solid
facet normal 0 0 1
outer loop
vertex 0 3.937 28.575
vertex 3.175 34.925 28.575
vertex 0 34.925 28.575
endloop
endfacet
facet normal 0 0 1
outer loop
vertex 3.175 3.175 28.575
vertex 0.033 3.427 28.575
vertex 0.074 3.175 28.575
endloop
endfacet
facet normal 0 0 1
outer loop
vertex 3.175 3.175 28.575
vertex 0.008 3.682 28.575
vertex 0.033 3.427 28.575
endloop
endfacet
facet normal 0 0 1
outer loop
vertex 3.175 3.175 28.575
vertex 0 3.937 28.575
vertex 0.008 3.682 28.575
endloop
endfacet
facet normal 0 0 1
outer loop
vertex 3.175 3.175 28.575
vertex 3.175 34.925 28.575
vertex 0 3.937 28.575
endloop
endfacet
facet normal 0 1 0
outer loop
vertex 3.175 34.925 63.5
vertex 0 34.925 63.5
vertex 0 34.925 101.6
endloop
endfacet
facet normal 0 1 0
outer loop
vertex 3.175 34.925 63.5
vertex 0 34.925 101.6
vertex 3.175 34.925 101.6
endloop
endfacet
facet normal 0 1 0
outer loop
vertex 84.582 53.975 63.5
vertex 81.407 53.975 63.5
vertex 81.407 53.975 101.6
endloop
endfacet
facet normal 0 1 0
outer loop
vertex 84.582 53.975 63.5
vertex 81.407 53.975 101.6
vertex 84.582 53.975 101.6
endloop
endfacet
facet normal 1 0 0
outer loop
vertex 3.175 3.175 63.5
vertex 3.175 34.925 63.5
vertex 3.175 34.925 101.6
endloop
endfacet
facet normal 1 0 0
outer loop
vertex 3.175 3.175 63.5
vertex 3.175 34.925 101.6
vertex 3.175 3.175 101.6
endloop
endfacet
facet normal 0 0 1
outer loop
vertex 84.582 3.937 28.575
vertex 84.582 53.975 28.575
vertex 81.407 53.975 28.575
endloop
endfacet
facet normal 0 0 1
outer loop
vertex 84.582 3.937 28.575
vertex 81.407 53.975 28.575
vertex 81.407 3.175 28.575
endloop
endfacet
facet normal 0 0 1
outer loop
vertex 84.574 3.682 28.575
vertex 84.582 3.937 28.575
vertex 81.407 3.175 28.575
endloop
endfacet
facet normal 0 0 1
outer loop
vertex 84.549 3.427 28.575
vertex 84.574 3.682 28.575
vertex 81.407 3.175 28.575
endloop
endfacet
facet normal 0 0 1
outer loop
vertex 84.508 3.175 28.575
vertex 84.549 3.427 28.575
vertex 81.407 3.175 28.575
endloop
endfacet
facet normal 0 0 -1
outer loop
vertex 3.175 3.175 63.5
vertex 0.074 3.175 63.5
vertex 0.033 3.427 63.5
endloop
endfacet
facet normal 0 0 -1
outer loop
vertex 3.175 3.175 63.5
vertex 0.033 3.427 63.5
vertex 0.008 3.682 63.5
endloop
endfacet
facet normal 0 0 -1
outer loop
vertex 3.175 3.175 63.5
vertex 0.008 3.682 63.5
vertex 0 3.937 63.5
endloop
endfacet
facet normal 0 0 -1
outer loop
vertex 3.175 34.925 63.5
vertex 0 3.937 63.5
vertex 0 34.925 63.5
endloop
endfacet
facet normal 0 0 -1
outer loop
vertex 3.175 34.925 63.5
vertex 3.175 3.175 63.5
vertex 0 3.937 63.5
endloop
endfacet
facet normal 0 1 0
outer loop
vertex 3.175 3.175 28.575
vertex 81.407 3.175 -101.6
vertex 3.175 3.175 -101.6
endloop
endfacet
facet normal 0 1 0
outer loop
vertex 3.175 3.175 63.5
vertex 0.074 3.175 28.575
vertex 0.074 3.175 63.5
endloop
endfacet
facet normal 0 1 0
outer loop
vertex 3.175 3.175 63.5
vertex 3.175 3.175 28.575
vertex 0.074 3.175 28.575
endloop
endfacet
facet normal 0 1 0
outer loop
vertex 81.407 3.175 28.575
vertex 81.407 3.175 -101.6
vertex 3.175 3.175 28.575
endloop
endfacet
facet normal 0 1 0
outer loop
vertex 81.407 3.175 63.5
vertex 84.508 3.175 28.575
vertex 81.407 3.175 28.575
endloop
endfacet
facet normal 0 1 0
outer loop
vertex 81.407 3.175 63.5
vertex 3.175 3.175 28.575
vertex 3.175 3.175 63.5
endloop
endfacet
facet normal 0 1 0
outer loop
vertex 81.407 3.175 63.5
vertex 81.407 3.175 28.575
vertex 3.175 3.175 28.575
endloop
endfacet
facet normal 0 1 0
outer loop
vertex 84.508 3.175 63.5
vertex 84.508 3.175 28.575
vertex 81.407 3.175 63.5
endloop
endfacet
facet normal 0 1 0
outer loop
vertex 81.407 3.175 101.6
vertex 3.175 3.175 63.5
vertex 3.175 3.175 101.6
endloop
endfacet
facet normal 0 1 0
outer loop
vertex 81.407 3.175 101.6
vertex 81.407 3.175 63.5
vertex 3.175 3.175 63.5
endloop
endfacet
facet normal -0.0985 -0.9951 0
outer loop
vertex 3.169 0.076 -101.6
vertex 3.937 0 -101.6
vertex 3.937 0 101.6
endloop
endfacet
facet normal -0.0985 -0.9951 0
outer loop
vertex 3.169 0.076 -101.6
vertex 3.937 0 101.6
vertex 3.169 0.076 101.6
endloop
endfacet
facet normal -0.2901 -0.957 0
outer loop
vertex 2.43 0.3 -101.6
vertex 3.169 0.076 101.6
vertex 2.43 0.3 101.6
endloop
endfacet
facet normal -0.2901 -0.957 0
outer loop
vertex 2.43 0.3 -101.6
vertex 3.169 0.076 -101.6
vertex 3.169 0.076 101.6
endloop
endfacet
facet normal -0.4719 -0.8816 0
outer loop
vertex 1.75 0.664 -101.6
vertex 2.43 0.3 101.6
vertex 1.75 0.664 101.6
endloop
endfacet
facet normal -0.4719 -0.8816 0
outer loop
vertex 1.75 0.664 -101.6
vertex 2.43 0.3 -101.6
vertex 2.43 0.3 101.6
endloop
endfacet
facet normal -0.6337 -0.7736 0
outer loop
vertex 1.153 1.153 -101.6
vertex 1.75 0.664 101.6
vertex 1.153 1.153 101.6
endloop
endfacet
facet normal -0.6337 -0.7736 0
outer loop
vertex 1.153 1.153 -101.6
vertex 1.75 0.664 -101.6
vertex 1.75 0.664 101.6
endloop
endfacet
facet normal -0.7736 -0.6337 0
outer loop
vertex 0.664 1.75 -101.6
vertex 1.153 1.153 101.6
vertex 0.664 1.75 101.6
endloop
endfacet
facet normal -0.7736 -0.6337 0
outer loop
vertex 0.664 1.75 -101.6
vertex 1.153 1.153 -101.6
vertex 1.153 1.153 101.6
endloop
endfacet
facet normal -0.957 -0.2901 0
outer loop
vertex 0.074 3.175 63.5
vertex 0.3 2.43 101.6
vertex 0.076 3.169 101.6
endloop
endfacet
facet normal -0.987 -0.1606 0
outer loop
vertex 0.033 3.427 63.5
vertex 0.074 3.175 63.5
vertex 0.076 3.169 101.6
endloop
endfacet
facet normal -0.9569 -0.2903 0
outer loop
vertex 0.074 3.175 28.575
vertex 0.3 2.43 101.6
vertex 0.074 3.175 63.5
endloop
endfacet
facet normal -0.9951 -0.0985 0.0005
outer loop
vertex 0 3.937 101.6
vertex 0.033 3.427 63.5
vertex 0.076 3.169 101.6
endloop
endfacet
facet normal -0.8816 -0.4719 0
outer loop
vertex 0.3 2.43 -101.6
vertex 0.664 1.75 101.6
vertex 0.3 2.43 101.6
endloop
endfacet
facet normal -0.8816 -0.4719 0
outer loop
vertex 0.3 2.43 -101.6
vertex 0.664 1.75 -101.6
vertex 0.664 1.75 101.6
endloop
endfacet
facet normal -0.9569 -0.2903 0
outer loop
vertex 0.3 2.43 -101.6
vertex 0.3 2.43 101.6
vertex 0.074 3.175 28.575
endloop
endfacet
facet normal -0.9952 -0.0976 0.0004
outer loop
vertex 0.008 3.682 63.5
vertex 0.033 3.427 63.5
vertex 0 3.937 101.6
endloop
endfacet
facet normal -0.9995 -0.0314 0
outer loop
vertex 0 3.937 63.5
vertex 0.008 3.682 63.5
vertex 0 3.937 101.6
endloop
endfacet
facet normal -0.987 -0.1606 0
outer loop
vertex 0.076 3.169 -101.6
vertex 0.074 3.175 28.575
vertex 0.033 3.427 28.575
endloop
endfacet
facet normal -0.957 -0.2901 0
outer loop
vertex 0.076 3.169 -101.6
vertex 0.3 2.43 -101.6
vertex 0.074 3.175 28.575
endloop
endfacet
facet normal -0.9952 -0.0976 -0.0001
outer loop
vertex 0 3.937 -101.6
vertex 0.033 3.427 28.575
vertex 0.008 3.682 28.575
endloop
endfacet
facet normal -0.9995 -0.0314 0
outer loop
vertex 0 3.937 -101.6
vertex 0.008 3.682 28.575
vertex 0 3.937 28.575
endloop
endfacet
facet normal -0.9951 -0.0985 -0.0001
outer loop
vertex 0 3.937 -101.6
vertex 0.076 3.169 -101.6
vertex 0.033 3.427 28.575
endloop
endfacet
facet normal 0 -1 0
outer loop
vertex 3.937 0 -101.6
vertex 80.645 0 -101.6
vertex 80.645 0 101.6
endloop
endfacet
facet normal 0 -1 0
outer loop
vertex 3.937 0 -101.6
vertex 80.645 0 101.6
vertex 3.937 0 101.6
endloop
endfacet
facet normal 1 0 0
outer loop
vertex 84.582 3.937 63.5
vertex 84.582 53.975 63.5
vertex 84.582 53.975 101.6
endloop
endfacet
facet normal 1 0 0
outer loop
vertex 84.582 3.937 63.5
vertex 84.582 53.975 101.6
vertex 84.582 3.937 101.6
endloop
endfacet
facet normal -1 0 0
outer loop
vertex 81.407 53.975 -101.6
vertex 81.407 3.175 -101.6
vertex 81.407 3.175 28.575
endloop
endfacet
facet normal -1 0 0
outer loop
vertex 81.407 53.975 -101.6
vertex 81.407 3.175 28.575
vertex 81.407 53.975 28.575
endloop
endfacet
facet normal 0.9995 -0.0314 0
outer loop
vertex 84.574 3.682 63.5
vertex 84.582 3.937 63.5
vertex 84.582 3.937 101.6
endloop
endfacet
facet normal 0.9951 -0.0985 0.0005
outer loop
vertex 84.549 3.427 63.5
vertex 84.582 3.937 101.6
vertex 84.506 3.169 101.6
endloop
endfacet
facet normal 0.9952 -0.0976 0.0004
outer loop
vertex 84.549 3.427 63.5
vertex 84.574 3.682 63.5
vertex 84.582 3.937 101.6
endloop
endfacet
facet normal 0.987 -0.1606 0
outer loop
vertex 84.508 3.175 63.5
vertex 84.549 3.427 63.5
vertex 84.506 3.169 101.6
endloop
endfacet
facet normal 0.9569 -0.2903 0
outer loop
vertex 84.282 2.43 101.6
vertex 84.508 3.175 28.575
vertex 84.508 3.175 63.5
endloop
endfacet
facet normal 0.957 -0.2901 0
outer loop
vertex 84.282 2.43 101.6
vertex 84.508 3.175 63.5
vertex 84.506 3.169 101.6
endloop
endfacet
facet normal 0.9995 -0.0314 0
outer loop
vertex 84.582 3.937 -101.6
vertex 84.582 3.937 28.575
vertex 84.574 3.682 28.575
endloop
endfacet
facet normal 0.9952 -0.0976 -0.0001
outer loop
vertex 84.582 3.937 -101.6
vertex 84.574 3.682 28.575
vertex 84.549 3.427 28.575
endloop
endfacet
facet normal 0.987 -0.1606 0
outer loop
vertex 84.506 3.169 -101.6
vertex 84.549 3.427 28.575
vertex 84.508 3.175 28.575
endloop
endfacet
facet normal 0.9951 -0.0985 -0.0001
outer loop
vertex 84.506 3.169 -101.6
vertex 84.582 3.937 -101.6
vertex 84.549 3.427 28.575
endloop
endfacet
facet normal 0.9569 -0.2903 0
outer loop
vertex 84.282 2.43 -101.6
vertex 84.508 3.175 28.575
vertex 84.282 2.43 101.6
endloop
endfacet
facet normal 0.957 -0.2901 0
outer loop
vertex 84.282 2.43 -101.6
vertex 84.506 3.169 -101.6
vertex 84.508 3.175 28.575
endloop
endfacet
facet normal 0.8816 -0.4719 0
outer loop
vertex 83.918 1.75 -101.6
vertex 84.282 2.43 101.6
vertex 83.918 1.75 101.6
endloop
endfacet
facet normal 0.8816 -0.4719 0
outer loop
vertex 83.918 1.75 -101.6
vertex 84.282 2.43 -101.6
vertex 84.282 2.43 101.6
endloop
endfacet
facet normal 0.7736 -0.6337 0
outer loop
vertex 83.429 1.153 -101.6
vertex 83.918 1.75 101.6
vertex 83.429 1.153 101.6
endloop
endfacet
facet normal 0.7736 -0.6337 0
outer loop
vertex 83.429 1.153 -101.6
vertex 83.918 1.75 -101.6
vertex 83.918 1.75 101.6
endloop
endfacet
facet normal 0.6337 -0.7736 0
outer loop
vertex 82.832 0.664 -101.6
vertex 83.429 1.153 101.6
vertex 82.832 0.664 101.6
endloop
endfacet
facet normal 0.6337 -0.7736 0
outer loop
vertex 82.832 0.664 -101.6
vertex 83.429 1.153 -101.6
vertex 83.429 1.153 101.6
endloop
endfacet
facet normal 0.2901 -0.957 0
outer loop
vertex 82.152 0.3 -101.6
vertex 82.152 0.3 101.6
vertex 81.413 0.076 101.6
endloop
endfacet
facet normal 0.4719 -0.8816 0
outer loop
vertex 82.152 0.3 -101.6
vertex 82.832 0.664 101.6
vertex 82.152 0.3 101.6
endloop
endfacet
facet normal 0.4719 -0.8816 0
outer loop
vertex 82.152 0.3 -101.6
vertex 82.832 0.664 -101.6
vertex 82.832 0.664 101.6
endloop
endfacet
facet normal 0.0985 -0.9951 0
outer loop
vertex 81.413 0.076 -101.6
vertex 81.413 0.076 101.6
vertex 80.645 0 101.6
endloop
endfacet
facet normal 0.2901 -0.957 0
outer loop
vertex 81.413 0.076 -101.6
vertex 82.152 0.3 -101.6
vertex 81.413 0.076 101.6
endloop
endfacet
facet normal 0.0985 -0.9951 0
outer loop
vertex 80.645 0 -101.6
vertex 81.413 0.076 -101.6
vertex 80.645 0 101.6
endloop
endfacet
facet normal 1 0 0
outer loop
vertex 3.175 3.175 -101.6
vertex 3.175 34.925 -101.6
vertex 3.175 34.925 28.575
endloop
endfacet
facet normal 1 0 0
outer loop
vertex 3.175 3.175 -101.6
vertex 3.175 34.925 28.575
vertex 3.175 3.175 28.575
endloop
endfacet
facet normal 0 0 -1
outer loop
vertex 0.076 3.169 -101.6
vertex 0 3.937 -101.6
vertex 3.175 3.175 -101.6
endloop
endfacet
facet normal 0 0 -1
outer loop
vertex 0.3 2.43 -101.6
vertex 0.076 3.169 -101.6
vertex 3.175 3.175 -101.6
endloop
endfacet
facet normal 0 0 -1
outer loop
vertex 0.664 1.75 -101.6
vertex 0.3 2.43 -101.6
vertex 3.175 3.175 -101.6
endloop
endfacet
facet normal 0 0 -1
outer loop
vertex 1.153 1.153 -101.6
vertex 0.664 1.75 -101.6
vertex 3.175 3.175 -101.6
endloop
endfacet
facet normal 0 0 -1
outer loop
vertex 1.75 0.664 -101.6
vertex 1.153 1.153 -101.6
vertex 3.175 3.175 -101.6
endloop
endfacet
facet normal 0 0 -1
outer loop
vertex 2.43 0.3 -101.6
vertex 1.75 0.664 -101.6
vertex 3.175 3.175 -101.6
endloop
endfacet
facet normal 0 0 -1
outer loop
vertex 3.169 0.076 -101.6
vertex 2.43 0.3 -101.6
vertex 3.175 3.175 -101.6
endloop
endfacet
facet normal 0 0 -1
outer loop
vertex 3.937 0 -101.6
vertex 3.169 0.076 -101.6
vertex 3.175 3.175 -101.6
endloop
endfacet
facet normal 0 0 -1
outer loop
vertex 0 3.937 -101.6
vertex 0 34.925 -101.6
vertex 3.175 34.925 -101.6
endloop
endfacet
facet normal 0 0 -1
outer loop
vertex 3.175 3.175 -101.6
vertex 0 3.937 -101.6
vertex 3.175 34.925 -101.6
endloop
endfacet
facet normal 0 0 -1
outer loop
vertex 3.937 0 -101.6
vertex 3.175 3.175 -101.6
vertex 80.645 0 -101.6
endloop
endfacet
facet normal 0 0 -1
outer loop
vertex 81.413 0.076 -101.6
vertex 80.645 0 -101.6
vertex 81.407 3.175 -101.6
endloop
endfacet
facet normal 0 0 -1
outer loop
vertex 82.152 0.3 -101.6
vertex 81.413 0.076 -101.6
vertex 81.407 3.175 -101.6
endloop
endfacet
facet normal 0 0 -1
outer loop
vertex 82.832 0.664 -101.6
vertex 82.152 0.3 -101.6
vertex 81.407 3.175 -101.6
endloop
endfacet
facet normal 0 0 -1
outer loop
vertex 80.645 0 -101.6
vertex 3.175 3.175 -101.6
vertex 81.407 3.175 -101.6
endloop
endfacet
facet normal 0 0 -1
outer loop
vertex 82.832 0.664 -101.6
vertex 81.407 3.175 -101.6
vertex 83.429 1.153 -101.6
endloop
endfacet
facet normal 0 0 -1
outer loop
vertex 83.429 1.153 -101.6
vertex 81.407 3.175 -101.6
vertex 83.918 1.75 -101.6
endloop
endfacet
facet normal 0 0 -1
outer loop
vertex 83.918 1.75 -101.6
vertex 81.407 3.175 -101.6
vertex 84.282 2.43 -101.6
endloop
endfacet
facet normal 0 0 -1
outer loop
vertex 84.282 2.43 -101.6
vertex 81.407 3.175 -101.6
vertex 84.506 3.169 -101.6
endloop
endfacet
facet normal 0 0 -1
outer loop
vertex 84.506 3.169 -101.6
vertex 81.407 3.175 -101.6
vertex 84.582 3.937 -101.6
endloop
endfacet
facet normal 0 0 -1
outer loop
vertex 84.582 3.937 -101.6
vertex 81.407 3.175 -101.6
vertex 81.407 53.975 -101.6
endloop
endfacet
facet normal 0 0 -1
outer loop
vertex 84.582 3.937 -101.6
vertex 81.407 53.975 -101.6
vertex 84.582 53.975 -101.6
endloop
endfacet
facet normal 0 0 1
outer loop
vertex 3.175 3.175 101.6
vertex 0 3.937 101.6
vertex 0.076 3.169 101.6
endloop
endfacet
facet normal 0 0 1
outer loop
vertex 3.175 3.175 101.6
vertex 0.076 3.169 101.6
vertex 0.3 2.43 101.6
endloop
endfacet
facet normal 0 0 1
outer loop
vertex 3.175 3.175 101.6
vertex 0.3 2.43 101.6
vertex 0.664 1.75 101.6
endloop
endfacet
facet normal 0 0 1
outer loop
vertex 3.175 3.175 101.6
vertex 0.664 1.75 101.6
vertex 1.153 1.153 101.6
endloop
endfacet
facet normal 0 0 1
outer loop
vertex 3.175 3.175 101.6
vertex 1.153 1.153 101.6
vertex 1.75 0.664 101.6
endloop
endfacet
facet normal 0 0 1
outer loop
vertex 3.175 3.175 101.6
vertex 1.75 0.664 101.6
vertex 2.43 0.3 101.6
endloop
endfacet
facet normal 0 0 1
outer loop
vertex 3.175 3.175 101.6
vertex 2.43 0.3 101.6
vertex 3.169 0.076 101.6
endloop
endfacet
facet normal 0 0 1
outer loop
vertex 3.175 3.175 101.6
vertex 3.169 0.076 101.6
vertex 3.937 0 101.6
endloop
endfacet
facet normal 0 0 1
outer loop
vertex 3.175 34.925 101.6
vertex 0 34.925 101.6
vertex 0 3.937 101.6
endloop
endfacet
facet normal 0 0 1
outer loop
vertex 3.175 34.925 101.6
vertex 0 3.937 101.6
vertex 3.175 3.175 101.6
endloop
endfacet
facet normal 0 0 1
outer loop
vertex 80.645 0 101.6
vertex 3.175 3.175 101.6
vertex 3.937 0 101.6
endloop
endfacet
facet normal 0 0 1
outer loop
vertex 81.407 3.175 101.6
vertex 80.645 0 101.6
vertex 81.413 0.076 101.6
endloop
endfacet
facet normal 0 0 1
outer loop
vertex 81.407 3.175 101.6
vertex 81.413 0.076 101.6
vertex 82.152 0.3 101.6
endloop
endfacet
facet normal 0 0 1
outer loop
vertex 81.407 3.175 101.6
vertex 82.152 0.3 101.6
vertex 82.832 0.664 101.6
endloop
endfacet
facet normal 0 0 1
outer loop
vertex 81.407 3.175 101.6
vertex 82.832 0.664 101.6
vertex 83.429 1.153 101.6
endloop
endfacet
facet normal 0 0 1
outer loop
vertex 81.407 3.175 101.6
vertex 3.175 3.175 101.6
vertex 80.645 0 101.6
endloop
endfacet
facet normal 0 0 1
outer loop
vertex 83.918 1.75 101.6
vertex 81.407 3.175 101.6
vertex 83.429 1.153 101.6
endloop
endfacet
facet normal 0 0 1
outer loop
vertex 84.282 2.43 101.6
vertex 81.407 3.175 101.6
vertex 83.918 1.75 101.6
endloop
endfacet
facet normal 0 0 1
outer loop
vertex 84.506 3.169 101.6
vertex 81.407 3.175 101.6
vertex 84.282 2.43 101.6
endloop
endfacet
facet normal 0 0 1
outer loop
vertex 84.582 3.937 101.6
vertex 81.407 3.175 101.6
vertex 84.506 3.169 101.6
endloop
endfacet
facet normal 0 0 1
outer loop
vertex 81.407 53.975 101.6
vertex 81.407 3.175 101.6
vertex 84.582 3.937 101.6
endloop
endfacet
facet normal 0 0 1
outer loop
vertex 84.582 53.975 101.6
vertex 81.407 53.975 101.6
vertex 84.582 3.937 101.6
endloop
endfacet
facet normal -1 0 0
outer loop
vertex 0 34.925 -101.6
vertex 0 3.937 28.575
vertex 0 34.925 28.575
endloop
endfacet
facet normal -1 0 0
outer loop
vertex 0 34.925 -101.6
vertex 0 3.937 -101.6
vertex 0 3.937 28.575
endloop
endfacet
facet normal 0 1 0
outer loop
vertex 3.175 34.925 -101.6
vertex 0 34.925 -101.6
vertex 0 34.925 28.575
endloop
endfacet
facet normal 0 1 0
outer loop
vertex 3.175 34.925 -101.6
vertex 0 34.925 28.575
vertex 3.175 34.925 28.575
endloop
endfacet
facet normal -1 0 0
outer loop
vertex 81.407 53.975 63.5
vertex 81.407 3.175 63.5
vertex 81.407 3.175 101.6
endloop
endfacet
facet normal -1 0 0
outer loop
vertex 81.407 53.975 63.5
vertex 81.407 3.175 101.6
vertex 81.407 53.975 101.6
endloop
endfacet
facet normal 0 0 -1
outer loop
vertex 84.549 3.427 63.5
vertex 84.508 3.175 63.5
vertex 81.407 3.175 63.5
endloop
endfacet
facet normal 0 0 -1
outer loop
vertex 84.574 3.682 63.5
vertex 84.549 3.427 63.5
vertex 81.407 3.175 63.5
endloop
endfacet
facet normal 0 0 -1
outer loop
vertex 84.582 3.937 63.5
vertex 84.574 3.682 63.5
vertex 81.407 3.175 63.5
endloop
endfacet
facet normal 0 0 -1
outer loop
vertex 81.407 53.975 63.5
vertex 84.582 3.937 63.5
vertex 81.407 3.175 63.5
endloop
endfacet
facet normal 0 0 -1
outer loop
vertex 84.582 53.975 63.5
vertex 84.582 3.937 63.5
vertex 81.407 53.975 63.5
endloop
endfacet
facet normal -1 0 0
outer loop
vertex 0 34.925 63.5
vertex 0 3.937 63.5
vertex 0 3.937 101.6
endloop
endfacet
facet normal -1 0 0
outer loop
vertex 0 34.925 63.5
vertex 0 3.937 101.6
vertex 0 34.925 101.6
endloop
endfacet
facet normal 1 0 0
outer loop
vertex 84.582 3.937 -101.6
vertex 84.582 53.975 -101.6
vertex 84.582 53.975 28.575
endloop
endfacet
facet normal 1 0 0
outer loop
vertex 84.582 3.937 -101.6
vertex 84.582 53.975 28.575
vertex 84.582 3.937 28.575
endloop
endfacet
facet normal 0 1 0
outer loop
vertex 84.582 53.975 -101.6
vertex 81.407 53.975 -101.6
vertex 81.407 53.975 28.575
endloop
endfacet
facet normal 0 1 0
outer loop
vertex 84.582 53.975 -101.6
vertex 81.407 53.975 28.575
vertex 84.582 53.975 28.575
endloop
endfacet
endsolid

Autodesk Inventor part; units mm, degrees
ref_plane "YZ Plane" through (0, 0, 0) normal (1, 0, 0) x (0, 1, 0)
ref_plane "XZ Plane" through (0, 0, 0) normal (0, 1, 0) x (-1, 0, 0)
sketch "Sketch1" plane through (0, 0, 0) normal (0, 0, 1) x (1, 0, 0)
  line L0 (0, 3.937) -> (0, 34.925)
  line L1 (0, 34.925) -> (3.175, 34.925)
  line L2 (3.175, 34.925) -> (3.175, 3.175)
  line L3 (3.175, 3.175) -> (81.407, 3.175)
  line L4 (81.407, 3.175) -> (81.407, 53.975)
  line L5 (81.407, 53.975) -> (84.582, 53.975)
  line L6 (84.582, 53.975) -> (84.582, 3.937)
  line L7 (80.645, 0) -> (3.937, 0)
  arc A0 (80.645, 0) -> (84.582, 3.937) centre (80.645, 3.937) ccw
  arc A1 (0, 3.937) -> (3.937, 0) centre (3.937, 3.937) ccw
  point P0 (0, 0)
  dimension "d0" = 34.925
  dimension "d1" = 3.175
  dimension "d2" = 31.75
  dimension "d3" = 78.232
  dimension "d4" = 50.8
  dimension "d5" = 3.175
  dimension "d6" = 3.937
  dimension "d7" = 3.937
extrude "Extrusion1" add sketch "Sketch1" along normal mid plane 203.2
sketch "Sketch2" plane through (84.582, 3.937, 101.6) normal (1, 0, 0) x (0, 0, -1)
  line L0 (203.2, -0.762) -> (0, -0.762) projected
  line L1 (203.2, 50.038) -> (0, 50.038) projected
  line L2 (73.025, -0.762) -> (38.1, -0.762)
  line L3 (38.1, -0.762) -> (38.1, 50.038)
  line L4 (38.1, 50.038) -> (73.025, 50.038)
  line L5 (73.025, 50.038) -> (73.025, -0.762)
  line L6 (0, 0) -> (0, 50.038) projected
  point P0 (101.6, -3.937)
  point P1 (38.1, -0.762)
  dimension "d10" = 38.1
  dimension "d11" = 34.925
extrude "Extrusion2" cut sketch "Sketch2" against normal through all
properties part number "2020 Front Plate"
